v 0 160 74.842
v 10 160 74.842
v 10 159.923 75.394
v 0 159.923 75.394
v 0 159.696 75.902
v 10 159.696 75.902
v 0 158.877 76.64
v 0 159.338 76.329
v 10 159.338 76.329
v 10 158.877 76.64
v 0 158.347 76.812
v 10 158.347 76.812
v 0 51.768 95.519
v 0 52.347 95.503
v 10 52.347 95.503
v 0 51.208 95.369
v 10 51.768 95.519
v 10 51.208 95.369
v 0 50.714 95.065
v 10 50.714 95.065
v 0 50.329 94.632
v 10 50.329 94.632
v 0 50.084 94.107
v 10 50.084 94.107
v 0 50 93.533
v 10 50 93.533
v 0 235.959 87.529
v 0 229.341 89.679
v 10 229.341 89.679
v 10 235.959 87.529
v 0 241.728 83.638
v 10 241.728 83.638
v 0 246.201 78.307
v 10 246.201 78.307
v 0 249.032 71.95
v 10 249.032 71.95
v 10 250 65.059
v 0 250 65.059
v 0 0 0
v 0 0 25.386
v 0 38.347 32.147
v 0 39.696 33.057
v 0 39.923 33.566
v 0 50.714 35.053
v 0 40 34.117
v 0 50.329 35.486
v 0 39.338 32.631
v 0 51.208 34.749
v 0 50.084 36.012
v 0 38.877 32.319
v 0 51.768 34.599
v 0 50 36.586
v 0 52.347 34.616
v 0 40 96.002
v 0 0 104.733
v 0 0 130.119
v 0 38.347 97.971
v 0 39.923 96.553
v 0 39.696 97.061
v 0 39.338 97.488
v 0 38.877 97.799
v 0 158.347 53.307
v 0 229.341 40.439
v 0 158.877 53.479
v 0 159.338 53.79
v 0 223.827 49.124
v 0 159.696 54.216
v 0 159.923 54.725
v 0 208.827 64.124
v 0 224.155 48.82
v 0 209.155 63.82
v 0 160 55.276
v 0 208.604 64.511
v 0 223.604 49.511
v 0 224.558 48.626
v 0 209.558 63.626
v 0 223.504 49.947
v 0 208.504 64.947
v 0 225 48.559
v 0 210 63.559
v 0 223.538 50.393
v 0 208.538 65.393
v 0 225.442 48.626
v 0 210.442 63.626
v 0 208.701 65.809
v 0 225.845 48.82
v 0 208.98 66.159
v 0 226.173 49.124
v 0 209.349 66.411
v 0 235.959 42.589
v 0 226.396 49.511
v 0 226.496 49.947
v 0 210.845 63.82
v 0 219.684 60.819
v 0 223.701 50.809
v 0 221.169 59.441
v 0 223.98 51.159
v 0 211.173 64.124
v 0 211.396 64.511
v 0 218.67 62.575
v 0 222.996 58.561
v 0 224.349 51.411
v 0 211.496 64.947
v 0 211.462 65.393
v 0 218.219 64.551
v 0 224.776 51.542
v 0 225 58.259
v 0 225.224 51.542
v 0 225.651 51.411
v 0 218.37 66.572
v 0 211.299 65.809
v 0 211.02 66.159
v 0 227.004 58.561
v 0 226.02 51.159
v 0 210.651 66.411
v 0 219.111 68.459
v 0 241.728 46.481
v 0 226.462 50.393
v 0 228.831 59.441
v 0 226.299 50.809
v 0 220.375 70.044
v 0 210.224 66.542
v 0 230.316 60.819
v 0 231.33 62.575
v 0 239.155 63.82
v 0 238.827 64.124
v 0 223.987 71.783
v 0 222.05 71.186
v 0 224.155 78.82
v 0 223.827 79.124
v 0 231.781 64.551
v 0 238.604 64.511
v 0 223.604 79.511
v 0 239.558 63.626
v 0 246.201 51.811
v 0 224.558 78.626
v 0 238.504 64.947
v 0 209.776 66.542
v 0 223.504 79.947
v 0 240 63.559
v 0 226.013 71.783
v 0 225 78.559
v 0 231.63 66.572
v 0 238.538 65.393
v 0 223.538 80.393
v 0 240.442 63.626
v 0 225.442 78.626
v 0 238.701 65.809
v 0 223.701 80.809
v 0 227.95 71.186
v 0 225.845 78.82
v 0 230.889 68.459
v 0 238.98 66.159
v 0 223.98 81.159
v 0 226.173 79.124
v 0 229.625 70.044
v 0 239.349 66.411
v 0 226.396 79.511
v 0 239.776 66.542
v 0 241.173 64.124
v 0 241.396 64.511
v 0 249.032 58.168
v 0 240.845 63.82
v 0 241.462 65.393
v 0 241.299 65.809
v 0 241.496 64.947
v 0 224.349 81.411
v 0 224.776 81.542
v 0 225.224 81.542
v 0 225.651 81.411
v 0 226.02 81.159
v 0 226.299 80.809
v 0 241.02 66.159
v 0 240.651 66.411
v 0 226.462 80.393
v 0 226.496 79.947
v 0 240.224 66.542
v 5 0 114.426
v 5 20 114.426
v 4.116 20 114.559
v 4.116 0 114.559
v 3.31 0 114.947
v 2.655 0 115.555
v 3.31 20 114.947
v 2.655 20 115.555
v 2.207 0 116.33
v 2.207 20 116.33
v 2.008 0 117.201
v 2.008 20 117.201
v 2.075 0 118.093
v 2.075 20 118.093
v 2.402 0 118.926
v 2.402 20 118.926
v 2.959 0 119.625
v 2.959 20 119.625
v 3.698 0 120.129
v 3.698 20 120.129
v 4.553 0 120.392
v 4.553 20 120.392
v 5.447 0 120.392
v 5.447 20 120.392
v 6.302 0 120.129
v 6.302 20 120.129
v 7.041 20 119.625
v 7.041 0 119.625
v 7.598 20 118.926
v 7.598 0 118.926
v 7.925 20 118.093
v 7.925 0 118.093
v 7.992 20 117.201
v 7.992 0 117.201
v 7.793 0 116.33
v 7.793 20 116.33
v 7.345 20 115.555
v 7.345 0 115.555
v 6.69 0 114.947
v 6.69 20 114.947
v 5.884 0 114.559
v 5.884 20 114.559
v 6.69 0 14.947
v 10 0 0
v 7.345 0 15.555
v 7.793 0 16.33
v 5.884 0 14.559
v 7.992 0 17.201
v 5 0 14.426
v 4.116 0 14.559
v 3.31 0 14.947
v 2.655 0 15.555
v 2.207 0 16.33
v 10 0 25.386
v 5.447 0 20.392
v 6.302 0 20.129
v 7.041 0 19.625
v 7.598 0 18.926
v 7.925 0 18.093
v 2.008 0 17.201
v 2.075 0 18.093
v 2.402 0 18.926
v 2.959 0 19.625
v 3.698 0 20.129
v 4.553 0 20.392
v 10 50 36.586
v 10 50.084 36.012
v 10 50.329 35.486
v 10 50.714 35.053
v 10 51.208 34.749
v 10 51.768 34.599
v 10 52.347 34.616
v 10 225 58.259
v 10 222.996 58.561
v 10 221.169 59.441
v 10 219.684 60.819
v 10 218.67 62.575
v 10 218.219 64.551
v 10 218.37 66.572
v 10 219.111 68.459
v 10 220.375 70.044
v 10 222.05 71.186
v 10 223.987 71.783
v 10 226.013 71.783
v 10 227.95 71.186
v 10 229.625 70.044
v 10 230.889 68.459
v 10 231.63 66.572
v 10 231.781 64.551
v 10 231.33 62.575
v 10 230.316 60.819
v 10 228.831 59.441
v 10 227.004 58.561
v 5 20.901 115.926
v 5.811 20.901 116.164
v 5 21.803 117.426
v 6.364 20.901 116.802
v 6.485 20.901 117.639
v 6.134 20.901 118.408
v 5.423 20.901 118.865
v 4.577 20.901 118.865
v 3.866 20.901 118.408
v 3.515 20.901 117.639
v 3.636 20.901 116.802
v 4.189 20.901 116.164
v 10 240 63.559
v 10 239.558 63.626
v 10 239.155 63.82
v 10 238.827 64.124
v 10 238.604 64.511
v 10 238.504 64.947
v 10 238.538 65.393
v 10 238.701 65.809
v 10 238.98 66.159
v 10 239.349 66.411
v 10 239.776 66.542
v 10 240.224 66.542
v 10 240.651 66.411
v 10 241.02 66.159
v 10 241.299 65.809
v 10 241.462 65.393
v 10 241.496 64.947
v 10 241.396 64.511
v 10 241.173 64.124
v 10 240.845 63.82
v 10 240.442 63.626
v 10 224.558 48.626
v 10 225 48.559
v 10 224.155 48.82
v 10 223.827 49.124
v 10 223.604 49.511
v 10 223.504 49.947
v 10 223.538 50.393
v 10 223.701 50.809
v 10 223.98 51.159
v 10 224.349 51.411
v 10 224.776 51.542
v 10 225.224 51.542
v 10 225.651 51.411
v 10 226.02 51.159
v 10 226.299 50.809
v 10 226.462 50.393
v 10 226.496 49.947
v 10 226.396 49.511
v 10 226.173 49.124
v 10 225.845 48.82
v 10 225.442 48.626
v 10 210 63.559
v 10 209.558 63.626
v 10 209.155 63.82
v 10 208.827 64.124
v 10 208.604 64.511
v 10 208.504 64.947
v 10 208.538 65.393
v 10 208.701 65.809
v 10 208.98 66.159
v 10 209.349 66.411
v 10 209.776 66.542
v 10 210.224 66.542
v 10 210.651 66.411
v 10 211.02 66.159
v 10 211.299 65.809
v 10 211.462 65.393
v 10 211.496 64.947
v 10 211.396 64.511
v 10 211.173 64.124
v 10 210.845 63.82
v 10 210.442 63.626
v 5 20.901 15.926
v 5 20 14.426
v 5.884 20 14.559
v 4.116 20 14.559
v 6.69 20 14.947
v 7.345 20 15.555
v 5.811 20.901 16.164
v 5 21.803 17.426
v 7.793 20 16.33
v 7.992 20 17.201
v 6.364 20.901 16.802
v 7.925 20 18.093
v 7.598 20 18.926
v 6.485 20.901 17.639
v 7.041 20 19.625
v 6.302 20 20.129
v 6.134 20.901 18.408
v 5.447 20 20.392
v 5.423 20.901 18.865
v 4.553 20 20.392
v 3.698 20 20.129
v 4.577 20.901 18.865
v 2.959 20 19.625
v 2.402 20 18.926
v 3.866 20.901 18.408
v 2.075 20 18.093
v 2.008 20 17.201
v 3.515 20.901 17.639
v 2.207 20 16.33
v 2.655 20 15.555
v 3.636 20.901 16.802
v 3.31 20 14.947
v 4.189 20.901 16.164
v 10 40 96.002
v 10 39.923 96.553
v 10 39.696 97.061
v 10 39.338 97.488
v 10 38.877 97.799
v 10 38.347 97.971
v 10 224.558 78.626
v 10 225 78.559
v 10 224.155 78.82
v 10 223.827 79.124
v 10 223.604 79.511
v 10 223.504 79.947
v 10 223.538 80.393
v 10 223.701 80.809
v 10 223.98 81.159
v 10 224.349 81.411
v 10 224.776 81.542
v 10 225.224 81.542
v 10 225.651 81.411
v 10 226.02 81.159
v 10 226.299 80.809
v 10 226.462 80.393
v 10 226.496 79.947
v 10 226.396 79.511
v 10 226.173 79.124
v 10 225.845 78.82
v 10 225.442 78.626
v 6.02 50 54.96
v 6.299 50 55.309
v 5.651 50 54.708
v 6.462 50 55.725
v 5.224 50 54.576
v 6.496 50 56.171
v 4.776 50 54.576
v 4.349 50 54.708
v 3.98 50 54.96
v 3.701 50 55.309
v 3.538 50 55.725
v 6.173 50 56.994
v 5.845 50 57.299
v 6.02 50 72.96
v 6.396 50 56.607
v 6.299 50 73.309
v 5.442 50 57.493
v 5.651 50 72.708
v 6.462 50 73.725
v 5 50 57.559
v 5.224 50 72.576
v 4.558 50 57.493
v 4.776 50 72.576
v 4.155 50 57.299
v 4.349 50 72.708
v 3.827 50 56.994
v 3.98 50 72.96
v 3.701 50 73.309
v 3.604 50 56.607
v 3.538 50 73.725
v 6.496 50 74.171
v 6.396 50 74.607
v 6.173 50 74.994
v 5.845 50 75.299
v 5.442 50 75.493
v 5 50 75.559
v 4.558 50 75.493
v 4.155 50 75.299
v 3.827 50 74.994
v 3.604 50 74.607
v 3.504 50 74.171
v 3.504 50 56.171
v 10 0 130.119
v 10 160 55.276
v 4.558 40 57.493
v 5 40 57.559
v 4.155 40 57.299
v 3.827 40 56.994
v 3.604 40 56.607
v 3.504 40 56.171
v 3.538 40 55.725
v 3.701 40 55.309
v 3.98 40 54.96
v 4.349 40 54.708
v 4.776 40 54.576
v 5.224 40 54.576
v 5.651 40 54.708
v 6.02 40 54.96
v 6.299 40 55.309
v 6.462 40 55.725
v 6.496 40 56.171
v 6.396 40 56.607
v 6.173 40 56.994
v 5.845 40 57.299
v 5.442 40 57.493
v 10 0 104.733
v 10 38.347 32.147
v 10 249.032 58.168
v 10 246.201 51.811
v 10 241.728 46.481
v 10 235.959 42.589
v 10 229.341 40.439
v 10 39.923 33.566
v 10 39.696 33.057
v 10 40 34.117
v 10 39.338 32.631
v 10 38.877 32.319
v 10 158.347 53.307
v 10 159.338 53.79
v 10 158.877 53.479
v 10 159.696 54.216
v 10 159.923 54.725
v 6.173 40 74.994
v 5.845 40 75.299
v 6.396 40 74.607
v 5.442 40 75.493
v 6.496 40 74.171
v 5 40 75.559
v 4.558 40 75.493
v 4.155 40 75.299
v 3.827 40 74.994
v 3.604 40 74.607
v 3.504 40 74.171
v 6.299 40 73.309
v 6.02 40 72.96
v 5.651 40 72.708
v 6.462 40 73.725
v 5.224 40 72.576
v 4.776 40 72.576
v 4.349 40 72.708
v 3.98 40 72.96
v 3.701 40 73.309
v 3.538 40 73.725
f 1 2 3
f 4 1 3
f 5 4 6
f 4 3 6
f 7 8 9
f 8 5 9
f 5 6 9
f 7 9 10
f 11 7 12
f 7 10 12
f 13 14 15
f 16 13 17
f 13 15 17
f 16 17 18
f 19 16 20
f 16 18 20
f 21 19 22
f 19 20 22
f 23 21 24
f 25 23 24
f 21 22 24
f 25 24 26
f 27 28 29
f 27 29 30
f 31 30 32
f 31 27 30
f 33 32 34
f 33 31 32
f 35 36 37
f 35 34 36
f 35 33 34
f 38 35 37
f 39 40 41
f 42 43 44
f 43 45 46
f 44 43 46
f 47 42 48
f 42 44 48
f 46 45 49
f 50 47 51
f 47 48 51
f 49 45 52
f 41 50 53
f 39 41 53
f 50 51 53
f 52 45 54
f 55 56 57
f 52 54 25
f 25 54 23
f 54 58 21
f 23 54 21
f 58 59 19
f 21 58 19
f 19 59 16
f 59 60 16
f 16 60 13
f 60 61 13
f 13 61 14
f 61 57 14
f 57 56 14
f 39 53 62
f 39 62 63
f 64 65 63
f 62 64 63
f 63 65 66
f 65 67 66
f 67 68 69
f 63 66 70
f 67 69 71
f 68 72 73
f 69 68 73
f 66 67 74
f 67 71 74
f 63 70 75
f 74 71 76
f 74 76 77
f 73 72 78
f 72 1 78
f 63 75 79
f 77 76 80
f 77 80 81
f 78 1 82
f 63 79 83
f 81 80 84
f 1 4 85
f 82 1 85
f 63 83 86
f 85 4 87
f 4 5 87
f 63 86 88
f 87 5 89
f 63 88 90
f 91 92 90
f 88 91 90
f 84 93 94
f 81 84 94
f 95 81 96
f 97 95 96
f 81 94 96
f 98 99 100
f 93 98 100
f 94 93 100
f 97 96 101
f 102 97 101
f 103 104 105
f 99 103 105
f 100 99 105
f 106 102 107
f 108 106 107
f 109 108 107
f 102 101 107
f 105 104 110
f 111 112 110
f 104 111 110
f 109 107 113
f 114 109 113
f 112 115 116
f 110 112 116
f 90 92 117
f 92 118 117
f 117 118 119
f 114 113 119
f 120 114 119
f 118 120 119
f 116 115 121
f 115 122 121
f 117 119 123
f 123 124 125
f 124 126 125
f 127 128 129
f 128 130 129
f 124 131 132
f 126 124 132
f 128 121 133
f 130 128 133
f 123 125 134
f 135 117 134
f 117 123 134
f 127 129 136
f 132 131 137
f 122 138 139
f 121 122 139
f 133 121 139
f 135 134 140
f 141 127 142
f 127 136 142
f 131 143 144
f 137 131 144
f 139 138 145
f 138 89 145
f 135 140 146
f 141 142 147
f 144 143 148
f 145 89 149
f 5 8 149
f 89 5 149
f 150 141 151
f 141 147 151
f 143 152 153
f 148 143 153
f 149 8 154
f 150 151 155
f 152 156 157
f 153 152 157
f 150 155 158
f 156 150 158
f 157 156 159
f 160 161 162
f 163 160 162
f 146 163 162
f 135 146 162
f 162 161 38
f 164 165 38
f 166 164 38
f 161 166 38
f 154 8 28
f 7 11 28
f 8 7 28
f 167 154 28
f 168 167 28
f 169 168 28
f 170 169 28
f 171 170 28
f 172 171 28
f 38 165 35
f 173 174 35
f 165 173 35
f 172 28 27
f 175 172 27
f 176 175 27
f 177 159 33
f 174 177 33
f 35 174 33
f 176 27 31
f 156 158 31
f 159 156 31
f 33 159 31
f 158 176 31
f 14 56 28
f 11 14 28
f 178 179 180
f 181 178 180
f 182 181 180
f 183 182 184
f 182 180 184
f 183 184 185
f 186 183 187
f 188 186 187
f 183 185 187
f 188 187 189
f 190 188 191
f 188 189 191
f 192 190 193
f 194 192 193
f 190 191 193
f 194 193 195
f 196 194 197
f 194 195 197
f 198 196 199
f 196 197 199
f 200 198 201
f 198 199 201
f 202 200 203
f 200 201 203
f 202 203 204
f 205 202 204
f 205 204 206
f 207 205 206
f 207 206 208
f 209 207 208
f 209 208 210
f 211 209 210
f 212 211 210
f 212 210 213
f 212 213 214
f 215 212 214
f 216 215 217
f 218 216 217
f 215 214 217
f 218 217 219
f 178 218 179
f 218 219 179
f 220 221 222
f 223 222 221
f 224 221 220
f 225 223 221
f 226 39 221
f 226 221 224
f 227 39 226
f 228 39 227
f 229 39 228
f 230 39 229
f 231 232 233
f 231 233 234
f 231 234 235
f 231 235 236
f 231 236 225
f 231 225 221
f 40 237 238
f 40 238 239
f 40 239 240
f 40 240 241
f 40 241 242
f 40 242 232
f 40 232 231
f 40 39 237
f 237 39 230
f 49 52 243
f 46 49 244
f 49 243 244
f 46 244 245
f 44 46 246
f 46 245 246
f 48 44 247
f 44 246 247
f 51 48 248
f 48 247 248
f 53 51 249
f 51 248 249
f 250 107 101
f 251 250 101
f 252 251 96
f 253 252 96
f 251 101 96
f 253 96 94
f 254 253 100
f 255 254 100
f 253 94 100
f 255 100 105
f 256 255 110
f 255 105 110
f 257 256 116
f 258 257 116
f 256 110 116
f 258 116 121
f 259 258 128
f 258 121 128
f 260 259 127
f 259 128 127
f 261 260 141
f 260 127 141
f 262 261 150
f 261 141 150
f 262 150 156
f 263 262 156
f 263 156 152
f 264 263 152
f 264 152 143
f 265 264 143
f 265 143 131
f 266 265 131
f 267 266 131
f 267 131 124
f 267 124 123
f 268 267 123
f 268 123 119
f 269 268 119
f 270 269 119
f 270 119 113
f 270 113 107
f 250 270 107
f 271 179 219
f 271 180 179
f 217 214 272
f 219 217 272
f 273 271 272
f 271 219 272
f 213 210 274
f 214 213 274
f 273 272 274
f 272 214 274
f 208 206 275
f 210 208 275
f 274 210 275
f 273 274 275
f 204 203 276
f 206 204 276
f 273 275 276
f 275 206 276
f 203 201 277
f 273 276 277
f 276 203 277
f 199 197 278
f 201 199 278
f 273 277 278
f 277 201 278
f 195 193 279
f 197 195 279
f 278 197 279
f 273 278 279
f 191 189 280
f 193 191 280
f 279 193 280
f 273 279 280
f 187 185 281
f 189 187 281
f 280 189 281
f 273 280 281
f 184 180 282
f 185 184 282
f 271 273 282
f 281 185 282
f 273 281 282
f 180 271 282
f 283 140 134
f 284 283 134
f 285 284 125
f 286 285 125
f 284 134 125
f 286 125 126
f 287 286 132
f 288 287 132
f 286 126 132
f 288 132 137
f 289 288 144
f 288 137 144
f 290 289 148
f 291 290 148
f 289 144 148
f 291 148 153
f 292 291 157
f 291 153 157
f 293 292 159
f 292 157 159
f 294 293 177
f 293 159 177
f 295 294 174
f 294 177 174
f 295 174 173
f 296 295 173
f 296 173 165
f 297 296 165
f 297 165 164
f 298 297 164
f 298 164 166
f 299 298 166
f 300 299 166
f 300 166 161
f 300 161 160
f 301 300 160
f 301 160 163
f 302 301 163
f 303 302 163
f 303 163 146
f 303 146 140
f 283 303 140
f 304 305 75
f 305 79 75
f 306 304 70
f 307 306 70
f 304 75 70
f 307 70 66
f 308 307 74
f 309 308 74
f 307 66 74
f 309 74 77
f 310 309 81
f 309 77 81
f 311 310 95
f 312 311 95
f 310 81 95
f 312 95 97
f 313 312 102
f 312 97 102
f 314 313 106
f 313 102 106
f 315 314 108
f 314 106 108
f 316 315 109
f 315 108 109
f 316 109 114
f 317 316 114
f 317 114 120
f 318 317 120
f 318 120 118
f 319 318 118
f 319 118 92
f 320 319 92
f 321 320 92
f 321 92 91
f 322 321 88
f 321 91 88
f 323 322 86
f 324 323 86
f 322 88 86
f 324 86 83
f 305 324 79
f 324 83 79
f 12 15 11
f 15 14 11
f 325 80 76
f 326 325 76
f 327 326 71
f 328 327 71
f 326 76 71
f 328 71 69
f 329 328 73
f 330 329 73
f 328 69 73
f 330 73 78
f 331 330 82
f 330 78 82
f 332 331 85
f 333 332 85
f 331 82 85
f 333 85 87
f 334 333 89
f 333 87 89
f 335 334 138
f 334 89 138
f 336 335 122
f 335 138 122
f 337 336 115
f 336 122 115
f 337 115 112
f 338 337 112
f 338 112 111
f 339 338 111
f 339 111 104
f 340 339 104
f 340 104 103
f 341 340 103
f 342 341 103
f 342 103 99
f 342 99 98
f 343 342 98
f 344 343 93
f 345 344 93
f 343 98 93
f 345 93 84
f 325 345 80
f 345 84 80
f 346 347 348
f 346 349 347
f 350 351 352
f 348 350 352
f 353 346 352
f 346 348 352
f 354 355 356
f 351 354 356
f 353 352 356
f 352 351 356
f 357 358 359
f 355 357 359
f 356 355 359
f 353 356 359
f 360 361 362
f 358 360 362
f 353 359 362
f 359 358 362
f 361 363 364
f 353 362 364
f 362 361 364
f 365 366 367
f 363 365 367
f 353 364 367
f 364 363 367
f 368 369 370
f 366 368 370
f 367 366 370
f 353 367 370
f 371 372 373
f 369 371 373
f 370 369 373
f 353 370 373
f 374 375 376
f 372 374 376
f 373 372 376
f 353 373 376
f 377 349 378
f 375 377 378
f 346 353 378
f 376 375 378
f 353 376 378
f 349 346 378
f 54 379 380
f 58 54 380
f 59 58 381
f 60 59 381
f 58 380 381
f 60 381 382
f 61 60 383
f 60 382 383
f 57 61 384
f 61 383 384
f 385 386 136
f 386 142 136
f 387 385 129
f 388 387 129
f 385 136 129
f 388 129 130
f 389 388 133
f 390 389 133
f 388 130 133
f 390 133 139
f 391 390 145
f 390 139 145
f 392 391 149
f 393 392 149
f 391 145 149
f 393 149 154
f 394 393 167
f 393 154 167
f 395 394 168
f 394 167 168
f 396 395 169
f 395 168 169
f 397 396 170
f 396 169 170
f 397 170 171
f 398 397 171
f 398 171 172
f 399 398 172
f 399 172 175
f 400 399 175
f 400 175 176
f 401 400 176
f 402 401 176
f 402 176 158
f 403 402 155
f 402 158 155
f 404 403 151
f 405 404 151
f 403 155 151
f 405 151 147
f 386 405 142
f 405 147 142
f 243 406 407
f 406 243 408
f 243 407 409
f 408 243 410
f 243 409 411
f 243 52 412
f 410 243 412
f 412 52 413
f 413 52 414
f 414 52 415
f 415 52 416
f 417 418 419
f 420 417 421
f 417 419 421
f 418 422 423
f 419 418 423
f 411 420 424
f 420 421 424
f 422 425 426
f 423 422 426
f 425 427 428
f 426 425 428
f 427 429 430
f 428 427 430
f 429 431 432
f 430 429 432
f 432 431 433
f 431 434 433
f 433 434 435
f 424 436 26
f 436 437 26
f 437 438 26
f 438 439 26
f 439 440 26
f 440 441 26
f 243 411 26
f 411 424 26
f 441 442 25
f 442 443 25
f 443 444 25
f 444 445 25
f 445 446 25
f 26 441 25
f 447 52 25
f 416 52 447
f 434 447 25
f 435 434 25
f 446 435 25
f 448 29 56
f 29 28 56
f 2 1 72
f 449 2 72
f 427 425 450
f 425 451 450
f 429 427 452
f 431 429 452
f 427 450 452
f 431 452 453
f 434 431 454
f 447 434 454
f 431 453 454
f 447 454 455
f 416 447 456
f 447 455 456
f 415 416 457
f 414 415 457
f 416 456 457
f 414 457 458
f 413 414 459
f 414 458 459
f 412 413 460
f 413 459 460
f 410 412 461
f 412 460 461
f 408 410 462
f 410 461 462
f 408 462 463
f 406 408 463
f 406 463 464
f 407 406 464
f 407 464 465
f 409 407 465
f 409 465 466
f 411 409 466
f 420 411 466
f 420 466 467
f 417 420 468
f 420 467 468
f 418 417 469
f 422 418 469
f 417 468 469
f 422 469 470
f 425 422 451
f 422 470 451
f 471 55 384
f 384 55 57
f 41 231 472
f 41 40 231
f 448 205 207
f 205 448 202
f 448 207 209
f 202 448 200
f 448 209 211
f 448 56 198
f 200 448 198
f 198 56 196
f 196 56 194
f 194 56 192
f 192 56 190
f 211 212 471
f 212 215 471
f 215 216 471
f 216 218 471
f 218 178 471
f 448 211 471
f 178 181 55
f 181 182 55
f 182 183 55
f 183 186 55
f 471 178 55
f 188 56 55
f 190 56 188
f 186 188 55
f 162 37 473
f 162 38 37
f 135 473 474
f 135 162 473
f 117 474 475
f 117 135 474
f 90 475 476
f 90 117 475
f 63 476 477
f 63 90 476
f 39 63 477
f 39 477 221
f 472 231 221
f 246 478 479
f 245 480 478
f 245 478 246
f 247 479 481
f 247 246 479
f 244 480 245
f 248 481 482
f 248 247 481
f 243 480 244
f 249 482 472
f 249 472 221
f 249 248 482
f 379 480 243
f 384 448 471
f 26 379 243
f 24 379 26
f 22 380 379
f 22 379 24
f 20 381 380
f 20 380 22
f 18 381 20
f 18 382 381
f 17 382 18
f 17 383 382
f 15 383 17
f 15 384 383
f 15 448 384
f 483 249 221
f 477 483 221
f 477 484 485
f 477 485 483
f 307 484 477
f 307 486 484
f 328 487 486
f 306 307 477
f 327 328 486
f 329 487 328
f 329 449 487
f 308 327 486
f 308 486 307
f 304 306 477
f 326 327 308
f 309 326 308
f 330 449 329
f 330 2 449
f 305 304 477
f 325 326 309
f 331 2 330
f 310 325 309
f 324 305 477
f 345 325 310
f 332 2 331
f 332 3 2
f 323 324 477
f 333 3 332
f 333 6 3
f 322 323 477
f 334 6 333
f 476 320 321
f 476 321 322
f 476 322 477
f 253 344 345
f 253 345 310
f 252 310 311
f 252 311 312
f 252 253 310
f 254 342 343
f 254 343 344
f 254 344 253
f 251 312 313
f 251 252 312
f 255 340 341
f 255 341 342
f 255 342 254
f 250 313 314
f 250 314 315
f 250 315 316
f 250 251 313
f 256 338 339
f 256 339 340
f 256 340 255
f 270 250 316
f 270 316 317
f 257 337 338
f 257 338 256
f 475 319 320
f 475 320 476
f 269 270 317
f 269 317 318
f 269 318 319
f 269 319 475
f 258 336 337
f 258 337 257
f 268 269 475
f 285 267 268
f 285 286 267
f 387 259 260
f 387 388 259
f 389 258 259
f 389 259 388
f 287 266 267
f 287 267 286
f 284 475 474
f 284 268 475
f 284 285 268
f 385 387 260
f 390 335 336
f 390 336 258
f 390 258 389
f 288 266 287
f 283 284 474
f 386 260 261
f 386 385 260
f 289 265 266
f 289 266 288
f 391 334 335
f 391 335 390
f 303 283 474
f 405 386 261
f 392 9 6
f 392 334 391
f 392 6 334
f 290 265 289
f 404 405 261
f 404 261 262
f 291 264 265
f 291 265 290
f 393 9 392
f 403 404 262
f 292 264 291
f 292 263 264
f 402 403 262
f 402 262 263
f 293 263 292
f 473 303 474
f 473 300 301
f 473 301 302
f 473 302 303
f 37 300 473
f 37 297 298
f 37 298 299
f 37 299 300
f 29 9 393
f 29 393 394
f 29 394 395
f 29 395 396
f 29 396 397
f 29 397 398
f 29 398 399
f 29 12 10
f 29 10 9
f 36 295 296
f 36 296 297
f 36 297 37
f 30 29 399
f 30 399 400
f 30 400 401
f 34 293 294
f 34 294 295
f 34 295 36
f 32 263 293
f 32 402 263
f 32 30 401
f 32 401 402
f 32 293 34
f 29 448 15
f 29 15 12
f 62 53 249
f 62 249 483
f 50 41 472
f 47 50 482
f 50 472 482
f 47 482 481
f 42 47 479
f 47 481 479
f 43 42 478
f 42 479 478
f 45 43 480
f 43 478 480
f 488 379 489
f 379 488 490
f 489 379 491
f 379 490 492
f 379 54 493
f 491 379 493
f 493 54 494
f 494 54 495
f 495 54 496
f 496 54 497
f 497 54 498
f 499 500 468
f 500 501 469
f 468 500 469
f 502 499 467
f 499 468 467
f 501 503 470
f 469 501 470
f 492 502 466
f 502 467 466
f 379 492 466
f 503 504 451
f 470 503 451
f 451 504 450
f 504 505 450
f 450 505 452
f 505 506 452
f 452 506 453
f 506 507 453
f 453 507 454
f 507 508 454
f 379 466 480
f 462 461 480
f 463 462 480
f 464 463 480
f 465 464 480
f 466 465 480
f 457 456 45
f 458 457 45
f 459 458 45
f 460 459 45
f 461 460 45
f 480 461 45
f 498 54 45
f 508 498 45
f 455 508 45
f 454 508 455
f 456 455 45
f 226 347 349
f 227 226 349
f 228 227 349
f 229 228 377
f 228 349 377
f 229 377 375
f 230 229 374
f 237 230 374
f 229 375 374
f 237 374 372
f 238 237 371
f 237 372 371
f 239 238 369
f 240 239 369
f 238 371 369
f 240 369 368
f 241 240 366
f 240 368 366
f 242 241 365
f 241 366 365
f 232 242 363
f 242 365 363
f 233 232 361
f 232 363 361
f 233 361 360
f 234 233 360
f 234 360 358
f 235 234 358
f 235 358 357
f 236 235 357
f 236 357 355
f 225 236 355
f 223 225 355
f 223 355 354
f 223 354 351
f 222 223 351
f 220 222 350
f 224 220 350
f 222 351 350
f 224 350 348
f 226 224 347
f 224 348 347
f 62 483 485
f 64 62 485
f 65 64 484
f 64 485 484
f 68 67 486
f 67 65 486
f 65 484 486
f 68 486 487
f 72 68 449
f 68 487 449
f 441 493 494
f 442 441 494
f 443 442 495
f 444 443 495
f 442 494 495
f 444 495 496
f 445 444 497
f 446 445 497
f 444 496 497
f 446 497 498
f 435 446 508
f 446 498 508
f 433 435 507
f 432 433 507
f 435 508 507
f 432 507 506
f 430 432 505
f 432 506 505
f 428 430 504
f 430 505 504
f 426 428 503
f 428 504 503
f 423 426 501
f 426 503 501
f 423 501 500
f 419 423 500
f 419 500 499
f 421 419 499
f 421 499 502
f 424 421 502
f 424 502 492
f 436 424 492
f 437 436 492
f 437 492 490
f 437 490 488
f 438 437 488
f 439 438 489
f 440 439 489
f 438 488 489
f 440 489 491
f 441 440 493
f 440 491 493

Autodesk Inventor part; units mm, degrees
ref_plane "YZ Plane" through (0, 0, 0) normal (1, 0, 0) x (0, 1, 0)
ref_plane "XZ Plane" through (0, 0, 0) normal (0, 1, 0) x (-1, 0, 0)
ref_plane "XY Plane" through (0, 0, 0) normal (0, 0, 1) x (1, 0, 0)
sketch "Skizze1" plane through (0, 0, 0) normal (1, 0, 0) x (0, 1, 0)
  arc A0 (250, 65.0592) -> (229.3412, 89.6794) centre (225, 65.0592) ccw
  line L0 (225, 65.0592) -> (229.3412, 89.6794) construction
  line L1 (225, 65.0592) -> (250, 65.0592) construction
  line L2 (229.3412, 89.6794) -> (0, 130.1185)
  line L3 (0, 130.1185) -> (0, 104.7328)
  arc A1 (229.3412, 40.439) -> (250, 65.0592) centre (225, 65.0592) ccw
  line L4 (229.3412, 40.439) -> (0, 0)
  line L5 (0, 0) -> (92.864, 0) construction
  line L6 (0, 0) -> (0, 25.3857)
  line L7 (160, 76.5205) -> (160, 53.598)
  line L8 (40, 97.6797) -> (40, 32.4387)
  line L9 (50, 34.202) -> (50, 95.9165)
  line L10 (0, 104.7328) -> (40, 97.6797)
  line L11 (50, 95.9165) -> (160, 76.5205)
  line L12 (0, 25.3857) -> (40, 32.4387)
  line L13 (50, 34.202) -> (160, 53.598)
  dimension "d21" = 80
  dimension "d24" = 25
  dimension "d68" = 250
  dimension "d73" = 80
  dimension "d88" = 130.1185
  dimension "d89" = 79.3471
  dimension "d91" = 10
  dimension "d92" = 25
  dimension "d93" = 25
  dimension "d94" = 40
  dimension "d96" = 25
  dimension "d97" = 25
  dimension "d127" = 110
extrude "Extrusion2" add sketch "Skizze1" along normal blind 10
sketch "Skizze7" plane through (10, 0, 0) normal (1, 0, 0) x (0, 0, -1)
  arc A0 (-40.439, 229.3412) -> (-89.6794, 229.3412) centre (-65.0592, 225) ccw projected
  point P0 (0, 0)
hole "Bohrung6" at (10, 225, 65.0592) direction (-1, 0, 0) diameter 13.6 end through all
sketch "Skizze8" plane through (10, 0, 0) normal (1, 0, 0) x (0, 0, -1)
  circle A0 centre (-65.0592, 225) radius 6.8 projected
  line L0 (-65.0592, 225) -> (-65.0592, 240) construction
  point P0 (0, 0)
  point P1 (-80.0592, 225)
  point P2 (-65.0592, 210)
  point P3 (-50.0592, 225)
  dimension "d107" = 15
  dimension "d110" = 360
hole "Bohrung7" at (10, 240, 65.0592) at (10, 225, 80.0592) at (10, 210, 65.0592) at (10, 225, 50.0592) direction (-1, 0, 0) diameter 3 end through all
sketch "Skizze9" plane through (0, 0, 104.7328) normal (0, -1, 0) x (1, 0, 0)
  line L0 (0, 25.3857) -> (10, 25.3857) construction
  line L1 (5, 25.3857) -> (5, -104.7328) construction
  line L2 (0, -104.7328) -> (10, -104.7328) construction
  line L3 (0, 25.3857) -> (0, 0) construction
  line L4 (10, 25.3857) -> (10, 0) construction
  line L5 (0, 25.3857) -> (0, 0) construction
  line L6 (0, 0) -> (10, 0) construction
  line L7 (10, 25.3857) -> (10, 0) construction
  line L8 (0, 25.3857) -> (10, 25.3857) construction
  line L9 (0, 12.6928) -> (10, 12.6928) construction
  point P0 (5, 12.6928)
  point P1 (5, -87.3072)
  dimension "d119" = 100
hole "Bohrung8" at (5, 0, 117.4256) at (5, 0, 17.4256) direction (0, 1, 0) diameter 6 depth 20 tip angle 118
sketch "Skizze10" plane through (0, 50, 95.9165) normal (0, 1, 0) x (1, 0, 0)
  line L0 (10, 61.7144) -> (10, 0) construction
  line L1 (10, 30.8572) -> (0, 30.8572) construction
  point P0 (0, 95.9165)
  point P1 (5, 21.8572)
  point P2 (5, 39.8572)
  dimension "d128" = 5
  dimension "d130" = 9
  dimension "d132" = 5
  dimension "d133" = 18
hole "Bohrung9" at (5, 50, 74.0592) at (5, 50, 56.0592) direction (0, -1, 0) diameter 3 end through all
fillet "Rundung1" radius 2 6 edges at (5, 160, 76.5205) (5, 40, 97.6797) (5, 50, 95.9165) (5, 50, 34.202) (5, 160, 53.598) (5, 40, 32.4387)
properties part number "halter_seite"
